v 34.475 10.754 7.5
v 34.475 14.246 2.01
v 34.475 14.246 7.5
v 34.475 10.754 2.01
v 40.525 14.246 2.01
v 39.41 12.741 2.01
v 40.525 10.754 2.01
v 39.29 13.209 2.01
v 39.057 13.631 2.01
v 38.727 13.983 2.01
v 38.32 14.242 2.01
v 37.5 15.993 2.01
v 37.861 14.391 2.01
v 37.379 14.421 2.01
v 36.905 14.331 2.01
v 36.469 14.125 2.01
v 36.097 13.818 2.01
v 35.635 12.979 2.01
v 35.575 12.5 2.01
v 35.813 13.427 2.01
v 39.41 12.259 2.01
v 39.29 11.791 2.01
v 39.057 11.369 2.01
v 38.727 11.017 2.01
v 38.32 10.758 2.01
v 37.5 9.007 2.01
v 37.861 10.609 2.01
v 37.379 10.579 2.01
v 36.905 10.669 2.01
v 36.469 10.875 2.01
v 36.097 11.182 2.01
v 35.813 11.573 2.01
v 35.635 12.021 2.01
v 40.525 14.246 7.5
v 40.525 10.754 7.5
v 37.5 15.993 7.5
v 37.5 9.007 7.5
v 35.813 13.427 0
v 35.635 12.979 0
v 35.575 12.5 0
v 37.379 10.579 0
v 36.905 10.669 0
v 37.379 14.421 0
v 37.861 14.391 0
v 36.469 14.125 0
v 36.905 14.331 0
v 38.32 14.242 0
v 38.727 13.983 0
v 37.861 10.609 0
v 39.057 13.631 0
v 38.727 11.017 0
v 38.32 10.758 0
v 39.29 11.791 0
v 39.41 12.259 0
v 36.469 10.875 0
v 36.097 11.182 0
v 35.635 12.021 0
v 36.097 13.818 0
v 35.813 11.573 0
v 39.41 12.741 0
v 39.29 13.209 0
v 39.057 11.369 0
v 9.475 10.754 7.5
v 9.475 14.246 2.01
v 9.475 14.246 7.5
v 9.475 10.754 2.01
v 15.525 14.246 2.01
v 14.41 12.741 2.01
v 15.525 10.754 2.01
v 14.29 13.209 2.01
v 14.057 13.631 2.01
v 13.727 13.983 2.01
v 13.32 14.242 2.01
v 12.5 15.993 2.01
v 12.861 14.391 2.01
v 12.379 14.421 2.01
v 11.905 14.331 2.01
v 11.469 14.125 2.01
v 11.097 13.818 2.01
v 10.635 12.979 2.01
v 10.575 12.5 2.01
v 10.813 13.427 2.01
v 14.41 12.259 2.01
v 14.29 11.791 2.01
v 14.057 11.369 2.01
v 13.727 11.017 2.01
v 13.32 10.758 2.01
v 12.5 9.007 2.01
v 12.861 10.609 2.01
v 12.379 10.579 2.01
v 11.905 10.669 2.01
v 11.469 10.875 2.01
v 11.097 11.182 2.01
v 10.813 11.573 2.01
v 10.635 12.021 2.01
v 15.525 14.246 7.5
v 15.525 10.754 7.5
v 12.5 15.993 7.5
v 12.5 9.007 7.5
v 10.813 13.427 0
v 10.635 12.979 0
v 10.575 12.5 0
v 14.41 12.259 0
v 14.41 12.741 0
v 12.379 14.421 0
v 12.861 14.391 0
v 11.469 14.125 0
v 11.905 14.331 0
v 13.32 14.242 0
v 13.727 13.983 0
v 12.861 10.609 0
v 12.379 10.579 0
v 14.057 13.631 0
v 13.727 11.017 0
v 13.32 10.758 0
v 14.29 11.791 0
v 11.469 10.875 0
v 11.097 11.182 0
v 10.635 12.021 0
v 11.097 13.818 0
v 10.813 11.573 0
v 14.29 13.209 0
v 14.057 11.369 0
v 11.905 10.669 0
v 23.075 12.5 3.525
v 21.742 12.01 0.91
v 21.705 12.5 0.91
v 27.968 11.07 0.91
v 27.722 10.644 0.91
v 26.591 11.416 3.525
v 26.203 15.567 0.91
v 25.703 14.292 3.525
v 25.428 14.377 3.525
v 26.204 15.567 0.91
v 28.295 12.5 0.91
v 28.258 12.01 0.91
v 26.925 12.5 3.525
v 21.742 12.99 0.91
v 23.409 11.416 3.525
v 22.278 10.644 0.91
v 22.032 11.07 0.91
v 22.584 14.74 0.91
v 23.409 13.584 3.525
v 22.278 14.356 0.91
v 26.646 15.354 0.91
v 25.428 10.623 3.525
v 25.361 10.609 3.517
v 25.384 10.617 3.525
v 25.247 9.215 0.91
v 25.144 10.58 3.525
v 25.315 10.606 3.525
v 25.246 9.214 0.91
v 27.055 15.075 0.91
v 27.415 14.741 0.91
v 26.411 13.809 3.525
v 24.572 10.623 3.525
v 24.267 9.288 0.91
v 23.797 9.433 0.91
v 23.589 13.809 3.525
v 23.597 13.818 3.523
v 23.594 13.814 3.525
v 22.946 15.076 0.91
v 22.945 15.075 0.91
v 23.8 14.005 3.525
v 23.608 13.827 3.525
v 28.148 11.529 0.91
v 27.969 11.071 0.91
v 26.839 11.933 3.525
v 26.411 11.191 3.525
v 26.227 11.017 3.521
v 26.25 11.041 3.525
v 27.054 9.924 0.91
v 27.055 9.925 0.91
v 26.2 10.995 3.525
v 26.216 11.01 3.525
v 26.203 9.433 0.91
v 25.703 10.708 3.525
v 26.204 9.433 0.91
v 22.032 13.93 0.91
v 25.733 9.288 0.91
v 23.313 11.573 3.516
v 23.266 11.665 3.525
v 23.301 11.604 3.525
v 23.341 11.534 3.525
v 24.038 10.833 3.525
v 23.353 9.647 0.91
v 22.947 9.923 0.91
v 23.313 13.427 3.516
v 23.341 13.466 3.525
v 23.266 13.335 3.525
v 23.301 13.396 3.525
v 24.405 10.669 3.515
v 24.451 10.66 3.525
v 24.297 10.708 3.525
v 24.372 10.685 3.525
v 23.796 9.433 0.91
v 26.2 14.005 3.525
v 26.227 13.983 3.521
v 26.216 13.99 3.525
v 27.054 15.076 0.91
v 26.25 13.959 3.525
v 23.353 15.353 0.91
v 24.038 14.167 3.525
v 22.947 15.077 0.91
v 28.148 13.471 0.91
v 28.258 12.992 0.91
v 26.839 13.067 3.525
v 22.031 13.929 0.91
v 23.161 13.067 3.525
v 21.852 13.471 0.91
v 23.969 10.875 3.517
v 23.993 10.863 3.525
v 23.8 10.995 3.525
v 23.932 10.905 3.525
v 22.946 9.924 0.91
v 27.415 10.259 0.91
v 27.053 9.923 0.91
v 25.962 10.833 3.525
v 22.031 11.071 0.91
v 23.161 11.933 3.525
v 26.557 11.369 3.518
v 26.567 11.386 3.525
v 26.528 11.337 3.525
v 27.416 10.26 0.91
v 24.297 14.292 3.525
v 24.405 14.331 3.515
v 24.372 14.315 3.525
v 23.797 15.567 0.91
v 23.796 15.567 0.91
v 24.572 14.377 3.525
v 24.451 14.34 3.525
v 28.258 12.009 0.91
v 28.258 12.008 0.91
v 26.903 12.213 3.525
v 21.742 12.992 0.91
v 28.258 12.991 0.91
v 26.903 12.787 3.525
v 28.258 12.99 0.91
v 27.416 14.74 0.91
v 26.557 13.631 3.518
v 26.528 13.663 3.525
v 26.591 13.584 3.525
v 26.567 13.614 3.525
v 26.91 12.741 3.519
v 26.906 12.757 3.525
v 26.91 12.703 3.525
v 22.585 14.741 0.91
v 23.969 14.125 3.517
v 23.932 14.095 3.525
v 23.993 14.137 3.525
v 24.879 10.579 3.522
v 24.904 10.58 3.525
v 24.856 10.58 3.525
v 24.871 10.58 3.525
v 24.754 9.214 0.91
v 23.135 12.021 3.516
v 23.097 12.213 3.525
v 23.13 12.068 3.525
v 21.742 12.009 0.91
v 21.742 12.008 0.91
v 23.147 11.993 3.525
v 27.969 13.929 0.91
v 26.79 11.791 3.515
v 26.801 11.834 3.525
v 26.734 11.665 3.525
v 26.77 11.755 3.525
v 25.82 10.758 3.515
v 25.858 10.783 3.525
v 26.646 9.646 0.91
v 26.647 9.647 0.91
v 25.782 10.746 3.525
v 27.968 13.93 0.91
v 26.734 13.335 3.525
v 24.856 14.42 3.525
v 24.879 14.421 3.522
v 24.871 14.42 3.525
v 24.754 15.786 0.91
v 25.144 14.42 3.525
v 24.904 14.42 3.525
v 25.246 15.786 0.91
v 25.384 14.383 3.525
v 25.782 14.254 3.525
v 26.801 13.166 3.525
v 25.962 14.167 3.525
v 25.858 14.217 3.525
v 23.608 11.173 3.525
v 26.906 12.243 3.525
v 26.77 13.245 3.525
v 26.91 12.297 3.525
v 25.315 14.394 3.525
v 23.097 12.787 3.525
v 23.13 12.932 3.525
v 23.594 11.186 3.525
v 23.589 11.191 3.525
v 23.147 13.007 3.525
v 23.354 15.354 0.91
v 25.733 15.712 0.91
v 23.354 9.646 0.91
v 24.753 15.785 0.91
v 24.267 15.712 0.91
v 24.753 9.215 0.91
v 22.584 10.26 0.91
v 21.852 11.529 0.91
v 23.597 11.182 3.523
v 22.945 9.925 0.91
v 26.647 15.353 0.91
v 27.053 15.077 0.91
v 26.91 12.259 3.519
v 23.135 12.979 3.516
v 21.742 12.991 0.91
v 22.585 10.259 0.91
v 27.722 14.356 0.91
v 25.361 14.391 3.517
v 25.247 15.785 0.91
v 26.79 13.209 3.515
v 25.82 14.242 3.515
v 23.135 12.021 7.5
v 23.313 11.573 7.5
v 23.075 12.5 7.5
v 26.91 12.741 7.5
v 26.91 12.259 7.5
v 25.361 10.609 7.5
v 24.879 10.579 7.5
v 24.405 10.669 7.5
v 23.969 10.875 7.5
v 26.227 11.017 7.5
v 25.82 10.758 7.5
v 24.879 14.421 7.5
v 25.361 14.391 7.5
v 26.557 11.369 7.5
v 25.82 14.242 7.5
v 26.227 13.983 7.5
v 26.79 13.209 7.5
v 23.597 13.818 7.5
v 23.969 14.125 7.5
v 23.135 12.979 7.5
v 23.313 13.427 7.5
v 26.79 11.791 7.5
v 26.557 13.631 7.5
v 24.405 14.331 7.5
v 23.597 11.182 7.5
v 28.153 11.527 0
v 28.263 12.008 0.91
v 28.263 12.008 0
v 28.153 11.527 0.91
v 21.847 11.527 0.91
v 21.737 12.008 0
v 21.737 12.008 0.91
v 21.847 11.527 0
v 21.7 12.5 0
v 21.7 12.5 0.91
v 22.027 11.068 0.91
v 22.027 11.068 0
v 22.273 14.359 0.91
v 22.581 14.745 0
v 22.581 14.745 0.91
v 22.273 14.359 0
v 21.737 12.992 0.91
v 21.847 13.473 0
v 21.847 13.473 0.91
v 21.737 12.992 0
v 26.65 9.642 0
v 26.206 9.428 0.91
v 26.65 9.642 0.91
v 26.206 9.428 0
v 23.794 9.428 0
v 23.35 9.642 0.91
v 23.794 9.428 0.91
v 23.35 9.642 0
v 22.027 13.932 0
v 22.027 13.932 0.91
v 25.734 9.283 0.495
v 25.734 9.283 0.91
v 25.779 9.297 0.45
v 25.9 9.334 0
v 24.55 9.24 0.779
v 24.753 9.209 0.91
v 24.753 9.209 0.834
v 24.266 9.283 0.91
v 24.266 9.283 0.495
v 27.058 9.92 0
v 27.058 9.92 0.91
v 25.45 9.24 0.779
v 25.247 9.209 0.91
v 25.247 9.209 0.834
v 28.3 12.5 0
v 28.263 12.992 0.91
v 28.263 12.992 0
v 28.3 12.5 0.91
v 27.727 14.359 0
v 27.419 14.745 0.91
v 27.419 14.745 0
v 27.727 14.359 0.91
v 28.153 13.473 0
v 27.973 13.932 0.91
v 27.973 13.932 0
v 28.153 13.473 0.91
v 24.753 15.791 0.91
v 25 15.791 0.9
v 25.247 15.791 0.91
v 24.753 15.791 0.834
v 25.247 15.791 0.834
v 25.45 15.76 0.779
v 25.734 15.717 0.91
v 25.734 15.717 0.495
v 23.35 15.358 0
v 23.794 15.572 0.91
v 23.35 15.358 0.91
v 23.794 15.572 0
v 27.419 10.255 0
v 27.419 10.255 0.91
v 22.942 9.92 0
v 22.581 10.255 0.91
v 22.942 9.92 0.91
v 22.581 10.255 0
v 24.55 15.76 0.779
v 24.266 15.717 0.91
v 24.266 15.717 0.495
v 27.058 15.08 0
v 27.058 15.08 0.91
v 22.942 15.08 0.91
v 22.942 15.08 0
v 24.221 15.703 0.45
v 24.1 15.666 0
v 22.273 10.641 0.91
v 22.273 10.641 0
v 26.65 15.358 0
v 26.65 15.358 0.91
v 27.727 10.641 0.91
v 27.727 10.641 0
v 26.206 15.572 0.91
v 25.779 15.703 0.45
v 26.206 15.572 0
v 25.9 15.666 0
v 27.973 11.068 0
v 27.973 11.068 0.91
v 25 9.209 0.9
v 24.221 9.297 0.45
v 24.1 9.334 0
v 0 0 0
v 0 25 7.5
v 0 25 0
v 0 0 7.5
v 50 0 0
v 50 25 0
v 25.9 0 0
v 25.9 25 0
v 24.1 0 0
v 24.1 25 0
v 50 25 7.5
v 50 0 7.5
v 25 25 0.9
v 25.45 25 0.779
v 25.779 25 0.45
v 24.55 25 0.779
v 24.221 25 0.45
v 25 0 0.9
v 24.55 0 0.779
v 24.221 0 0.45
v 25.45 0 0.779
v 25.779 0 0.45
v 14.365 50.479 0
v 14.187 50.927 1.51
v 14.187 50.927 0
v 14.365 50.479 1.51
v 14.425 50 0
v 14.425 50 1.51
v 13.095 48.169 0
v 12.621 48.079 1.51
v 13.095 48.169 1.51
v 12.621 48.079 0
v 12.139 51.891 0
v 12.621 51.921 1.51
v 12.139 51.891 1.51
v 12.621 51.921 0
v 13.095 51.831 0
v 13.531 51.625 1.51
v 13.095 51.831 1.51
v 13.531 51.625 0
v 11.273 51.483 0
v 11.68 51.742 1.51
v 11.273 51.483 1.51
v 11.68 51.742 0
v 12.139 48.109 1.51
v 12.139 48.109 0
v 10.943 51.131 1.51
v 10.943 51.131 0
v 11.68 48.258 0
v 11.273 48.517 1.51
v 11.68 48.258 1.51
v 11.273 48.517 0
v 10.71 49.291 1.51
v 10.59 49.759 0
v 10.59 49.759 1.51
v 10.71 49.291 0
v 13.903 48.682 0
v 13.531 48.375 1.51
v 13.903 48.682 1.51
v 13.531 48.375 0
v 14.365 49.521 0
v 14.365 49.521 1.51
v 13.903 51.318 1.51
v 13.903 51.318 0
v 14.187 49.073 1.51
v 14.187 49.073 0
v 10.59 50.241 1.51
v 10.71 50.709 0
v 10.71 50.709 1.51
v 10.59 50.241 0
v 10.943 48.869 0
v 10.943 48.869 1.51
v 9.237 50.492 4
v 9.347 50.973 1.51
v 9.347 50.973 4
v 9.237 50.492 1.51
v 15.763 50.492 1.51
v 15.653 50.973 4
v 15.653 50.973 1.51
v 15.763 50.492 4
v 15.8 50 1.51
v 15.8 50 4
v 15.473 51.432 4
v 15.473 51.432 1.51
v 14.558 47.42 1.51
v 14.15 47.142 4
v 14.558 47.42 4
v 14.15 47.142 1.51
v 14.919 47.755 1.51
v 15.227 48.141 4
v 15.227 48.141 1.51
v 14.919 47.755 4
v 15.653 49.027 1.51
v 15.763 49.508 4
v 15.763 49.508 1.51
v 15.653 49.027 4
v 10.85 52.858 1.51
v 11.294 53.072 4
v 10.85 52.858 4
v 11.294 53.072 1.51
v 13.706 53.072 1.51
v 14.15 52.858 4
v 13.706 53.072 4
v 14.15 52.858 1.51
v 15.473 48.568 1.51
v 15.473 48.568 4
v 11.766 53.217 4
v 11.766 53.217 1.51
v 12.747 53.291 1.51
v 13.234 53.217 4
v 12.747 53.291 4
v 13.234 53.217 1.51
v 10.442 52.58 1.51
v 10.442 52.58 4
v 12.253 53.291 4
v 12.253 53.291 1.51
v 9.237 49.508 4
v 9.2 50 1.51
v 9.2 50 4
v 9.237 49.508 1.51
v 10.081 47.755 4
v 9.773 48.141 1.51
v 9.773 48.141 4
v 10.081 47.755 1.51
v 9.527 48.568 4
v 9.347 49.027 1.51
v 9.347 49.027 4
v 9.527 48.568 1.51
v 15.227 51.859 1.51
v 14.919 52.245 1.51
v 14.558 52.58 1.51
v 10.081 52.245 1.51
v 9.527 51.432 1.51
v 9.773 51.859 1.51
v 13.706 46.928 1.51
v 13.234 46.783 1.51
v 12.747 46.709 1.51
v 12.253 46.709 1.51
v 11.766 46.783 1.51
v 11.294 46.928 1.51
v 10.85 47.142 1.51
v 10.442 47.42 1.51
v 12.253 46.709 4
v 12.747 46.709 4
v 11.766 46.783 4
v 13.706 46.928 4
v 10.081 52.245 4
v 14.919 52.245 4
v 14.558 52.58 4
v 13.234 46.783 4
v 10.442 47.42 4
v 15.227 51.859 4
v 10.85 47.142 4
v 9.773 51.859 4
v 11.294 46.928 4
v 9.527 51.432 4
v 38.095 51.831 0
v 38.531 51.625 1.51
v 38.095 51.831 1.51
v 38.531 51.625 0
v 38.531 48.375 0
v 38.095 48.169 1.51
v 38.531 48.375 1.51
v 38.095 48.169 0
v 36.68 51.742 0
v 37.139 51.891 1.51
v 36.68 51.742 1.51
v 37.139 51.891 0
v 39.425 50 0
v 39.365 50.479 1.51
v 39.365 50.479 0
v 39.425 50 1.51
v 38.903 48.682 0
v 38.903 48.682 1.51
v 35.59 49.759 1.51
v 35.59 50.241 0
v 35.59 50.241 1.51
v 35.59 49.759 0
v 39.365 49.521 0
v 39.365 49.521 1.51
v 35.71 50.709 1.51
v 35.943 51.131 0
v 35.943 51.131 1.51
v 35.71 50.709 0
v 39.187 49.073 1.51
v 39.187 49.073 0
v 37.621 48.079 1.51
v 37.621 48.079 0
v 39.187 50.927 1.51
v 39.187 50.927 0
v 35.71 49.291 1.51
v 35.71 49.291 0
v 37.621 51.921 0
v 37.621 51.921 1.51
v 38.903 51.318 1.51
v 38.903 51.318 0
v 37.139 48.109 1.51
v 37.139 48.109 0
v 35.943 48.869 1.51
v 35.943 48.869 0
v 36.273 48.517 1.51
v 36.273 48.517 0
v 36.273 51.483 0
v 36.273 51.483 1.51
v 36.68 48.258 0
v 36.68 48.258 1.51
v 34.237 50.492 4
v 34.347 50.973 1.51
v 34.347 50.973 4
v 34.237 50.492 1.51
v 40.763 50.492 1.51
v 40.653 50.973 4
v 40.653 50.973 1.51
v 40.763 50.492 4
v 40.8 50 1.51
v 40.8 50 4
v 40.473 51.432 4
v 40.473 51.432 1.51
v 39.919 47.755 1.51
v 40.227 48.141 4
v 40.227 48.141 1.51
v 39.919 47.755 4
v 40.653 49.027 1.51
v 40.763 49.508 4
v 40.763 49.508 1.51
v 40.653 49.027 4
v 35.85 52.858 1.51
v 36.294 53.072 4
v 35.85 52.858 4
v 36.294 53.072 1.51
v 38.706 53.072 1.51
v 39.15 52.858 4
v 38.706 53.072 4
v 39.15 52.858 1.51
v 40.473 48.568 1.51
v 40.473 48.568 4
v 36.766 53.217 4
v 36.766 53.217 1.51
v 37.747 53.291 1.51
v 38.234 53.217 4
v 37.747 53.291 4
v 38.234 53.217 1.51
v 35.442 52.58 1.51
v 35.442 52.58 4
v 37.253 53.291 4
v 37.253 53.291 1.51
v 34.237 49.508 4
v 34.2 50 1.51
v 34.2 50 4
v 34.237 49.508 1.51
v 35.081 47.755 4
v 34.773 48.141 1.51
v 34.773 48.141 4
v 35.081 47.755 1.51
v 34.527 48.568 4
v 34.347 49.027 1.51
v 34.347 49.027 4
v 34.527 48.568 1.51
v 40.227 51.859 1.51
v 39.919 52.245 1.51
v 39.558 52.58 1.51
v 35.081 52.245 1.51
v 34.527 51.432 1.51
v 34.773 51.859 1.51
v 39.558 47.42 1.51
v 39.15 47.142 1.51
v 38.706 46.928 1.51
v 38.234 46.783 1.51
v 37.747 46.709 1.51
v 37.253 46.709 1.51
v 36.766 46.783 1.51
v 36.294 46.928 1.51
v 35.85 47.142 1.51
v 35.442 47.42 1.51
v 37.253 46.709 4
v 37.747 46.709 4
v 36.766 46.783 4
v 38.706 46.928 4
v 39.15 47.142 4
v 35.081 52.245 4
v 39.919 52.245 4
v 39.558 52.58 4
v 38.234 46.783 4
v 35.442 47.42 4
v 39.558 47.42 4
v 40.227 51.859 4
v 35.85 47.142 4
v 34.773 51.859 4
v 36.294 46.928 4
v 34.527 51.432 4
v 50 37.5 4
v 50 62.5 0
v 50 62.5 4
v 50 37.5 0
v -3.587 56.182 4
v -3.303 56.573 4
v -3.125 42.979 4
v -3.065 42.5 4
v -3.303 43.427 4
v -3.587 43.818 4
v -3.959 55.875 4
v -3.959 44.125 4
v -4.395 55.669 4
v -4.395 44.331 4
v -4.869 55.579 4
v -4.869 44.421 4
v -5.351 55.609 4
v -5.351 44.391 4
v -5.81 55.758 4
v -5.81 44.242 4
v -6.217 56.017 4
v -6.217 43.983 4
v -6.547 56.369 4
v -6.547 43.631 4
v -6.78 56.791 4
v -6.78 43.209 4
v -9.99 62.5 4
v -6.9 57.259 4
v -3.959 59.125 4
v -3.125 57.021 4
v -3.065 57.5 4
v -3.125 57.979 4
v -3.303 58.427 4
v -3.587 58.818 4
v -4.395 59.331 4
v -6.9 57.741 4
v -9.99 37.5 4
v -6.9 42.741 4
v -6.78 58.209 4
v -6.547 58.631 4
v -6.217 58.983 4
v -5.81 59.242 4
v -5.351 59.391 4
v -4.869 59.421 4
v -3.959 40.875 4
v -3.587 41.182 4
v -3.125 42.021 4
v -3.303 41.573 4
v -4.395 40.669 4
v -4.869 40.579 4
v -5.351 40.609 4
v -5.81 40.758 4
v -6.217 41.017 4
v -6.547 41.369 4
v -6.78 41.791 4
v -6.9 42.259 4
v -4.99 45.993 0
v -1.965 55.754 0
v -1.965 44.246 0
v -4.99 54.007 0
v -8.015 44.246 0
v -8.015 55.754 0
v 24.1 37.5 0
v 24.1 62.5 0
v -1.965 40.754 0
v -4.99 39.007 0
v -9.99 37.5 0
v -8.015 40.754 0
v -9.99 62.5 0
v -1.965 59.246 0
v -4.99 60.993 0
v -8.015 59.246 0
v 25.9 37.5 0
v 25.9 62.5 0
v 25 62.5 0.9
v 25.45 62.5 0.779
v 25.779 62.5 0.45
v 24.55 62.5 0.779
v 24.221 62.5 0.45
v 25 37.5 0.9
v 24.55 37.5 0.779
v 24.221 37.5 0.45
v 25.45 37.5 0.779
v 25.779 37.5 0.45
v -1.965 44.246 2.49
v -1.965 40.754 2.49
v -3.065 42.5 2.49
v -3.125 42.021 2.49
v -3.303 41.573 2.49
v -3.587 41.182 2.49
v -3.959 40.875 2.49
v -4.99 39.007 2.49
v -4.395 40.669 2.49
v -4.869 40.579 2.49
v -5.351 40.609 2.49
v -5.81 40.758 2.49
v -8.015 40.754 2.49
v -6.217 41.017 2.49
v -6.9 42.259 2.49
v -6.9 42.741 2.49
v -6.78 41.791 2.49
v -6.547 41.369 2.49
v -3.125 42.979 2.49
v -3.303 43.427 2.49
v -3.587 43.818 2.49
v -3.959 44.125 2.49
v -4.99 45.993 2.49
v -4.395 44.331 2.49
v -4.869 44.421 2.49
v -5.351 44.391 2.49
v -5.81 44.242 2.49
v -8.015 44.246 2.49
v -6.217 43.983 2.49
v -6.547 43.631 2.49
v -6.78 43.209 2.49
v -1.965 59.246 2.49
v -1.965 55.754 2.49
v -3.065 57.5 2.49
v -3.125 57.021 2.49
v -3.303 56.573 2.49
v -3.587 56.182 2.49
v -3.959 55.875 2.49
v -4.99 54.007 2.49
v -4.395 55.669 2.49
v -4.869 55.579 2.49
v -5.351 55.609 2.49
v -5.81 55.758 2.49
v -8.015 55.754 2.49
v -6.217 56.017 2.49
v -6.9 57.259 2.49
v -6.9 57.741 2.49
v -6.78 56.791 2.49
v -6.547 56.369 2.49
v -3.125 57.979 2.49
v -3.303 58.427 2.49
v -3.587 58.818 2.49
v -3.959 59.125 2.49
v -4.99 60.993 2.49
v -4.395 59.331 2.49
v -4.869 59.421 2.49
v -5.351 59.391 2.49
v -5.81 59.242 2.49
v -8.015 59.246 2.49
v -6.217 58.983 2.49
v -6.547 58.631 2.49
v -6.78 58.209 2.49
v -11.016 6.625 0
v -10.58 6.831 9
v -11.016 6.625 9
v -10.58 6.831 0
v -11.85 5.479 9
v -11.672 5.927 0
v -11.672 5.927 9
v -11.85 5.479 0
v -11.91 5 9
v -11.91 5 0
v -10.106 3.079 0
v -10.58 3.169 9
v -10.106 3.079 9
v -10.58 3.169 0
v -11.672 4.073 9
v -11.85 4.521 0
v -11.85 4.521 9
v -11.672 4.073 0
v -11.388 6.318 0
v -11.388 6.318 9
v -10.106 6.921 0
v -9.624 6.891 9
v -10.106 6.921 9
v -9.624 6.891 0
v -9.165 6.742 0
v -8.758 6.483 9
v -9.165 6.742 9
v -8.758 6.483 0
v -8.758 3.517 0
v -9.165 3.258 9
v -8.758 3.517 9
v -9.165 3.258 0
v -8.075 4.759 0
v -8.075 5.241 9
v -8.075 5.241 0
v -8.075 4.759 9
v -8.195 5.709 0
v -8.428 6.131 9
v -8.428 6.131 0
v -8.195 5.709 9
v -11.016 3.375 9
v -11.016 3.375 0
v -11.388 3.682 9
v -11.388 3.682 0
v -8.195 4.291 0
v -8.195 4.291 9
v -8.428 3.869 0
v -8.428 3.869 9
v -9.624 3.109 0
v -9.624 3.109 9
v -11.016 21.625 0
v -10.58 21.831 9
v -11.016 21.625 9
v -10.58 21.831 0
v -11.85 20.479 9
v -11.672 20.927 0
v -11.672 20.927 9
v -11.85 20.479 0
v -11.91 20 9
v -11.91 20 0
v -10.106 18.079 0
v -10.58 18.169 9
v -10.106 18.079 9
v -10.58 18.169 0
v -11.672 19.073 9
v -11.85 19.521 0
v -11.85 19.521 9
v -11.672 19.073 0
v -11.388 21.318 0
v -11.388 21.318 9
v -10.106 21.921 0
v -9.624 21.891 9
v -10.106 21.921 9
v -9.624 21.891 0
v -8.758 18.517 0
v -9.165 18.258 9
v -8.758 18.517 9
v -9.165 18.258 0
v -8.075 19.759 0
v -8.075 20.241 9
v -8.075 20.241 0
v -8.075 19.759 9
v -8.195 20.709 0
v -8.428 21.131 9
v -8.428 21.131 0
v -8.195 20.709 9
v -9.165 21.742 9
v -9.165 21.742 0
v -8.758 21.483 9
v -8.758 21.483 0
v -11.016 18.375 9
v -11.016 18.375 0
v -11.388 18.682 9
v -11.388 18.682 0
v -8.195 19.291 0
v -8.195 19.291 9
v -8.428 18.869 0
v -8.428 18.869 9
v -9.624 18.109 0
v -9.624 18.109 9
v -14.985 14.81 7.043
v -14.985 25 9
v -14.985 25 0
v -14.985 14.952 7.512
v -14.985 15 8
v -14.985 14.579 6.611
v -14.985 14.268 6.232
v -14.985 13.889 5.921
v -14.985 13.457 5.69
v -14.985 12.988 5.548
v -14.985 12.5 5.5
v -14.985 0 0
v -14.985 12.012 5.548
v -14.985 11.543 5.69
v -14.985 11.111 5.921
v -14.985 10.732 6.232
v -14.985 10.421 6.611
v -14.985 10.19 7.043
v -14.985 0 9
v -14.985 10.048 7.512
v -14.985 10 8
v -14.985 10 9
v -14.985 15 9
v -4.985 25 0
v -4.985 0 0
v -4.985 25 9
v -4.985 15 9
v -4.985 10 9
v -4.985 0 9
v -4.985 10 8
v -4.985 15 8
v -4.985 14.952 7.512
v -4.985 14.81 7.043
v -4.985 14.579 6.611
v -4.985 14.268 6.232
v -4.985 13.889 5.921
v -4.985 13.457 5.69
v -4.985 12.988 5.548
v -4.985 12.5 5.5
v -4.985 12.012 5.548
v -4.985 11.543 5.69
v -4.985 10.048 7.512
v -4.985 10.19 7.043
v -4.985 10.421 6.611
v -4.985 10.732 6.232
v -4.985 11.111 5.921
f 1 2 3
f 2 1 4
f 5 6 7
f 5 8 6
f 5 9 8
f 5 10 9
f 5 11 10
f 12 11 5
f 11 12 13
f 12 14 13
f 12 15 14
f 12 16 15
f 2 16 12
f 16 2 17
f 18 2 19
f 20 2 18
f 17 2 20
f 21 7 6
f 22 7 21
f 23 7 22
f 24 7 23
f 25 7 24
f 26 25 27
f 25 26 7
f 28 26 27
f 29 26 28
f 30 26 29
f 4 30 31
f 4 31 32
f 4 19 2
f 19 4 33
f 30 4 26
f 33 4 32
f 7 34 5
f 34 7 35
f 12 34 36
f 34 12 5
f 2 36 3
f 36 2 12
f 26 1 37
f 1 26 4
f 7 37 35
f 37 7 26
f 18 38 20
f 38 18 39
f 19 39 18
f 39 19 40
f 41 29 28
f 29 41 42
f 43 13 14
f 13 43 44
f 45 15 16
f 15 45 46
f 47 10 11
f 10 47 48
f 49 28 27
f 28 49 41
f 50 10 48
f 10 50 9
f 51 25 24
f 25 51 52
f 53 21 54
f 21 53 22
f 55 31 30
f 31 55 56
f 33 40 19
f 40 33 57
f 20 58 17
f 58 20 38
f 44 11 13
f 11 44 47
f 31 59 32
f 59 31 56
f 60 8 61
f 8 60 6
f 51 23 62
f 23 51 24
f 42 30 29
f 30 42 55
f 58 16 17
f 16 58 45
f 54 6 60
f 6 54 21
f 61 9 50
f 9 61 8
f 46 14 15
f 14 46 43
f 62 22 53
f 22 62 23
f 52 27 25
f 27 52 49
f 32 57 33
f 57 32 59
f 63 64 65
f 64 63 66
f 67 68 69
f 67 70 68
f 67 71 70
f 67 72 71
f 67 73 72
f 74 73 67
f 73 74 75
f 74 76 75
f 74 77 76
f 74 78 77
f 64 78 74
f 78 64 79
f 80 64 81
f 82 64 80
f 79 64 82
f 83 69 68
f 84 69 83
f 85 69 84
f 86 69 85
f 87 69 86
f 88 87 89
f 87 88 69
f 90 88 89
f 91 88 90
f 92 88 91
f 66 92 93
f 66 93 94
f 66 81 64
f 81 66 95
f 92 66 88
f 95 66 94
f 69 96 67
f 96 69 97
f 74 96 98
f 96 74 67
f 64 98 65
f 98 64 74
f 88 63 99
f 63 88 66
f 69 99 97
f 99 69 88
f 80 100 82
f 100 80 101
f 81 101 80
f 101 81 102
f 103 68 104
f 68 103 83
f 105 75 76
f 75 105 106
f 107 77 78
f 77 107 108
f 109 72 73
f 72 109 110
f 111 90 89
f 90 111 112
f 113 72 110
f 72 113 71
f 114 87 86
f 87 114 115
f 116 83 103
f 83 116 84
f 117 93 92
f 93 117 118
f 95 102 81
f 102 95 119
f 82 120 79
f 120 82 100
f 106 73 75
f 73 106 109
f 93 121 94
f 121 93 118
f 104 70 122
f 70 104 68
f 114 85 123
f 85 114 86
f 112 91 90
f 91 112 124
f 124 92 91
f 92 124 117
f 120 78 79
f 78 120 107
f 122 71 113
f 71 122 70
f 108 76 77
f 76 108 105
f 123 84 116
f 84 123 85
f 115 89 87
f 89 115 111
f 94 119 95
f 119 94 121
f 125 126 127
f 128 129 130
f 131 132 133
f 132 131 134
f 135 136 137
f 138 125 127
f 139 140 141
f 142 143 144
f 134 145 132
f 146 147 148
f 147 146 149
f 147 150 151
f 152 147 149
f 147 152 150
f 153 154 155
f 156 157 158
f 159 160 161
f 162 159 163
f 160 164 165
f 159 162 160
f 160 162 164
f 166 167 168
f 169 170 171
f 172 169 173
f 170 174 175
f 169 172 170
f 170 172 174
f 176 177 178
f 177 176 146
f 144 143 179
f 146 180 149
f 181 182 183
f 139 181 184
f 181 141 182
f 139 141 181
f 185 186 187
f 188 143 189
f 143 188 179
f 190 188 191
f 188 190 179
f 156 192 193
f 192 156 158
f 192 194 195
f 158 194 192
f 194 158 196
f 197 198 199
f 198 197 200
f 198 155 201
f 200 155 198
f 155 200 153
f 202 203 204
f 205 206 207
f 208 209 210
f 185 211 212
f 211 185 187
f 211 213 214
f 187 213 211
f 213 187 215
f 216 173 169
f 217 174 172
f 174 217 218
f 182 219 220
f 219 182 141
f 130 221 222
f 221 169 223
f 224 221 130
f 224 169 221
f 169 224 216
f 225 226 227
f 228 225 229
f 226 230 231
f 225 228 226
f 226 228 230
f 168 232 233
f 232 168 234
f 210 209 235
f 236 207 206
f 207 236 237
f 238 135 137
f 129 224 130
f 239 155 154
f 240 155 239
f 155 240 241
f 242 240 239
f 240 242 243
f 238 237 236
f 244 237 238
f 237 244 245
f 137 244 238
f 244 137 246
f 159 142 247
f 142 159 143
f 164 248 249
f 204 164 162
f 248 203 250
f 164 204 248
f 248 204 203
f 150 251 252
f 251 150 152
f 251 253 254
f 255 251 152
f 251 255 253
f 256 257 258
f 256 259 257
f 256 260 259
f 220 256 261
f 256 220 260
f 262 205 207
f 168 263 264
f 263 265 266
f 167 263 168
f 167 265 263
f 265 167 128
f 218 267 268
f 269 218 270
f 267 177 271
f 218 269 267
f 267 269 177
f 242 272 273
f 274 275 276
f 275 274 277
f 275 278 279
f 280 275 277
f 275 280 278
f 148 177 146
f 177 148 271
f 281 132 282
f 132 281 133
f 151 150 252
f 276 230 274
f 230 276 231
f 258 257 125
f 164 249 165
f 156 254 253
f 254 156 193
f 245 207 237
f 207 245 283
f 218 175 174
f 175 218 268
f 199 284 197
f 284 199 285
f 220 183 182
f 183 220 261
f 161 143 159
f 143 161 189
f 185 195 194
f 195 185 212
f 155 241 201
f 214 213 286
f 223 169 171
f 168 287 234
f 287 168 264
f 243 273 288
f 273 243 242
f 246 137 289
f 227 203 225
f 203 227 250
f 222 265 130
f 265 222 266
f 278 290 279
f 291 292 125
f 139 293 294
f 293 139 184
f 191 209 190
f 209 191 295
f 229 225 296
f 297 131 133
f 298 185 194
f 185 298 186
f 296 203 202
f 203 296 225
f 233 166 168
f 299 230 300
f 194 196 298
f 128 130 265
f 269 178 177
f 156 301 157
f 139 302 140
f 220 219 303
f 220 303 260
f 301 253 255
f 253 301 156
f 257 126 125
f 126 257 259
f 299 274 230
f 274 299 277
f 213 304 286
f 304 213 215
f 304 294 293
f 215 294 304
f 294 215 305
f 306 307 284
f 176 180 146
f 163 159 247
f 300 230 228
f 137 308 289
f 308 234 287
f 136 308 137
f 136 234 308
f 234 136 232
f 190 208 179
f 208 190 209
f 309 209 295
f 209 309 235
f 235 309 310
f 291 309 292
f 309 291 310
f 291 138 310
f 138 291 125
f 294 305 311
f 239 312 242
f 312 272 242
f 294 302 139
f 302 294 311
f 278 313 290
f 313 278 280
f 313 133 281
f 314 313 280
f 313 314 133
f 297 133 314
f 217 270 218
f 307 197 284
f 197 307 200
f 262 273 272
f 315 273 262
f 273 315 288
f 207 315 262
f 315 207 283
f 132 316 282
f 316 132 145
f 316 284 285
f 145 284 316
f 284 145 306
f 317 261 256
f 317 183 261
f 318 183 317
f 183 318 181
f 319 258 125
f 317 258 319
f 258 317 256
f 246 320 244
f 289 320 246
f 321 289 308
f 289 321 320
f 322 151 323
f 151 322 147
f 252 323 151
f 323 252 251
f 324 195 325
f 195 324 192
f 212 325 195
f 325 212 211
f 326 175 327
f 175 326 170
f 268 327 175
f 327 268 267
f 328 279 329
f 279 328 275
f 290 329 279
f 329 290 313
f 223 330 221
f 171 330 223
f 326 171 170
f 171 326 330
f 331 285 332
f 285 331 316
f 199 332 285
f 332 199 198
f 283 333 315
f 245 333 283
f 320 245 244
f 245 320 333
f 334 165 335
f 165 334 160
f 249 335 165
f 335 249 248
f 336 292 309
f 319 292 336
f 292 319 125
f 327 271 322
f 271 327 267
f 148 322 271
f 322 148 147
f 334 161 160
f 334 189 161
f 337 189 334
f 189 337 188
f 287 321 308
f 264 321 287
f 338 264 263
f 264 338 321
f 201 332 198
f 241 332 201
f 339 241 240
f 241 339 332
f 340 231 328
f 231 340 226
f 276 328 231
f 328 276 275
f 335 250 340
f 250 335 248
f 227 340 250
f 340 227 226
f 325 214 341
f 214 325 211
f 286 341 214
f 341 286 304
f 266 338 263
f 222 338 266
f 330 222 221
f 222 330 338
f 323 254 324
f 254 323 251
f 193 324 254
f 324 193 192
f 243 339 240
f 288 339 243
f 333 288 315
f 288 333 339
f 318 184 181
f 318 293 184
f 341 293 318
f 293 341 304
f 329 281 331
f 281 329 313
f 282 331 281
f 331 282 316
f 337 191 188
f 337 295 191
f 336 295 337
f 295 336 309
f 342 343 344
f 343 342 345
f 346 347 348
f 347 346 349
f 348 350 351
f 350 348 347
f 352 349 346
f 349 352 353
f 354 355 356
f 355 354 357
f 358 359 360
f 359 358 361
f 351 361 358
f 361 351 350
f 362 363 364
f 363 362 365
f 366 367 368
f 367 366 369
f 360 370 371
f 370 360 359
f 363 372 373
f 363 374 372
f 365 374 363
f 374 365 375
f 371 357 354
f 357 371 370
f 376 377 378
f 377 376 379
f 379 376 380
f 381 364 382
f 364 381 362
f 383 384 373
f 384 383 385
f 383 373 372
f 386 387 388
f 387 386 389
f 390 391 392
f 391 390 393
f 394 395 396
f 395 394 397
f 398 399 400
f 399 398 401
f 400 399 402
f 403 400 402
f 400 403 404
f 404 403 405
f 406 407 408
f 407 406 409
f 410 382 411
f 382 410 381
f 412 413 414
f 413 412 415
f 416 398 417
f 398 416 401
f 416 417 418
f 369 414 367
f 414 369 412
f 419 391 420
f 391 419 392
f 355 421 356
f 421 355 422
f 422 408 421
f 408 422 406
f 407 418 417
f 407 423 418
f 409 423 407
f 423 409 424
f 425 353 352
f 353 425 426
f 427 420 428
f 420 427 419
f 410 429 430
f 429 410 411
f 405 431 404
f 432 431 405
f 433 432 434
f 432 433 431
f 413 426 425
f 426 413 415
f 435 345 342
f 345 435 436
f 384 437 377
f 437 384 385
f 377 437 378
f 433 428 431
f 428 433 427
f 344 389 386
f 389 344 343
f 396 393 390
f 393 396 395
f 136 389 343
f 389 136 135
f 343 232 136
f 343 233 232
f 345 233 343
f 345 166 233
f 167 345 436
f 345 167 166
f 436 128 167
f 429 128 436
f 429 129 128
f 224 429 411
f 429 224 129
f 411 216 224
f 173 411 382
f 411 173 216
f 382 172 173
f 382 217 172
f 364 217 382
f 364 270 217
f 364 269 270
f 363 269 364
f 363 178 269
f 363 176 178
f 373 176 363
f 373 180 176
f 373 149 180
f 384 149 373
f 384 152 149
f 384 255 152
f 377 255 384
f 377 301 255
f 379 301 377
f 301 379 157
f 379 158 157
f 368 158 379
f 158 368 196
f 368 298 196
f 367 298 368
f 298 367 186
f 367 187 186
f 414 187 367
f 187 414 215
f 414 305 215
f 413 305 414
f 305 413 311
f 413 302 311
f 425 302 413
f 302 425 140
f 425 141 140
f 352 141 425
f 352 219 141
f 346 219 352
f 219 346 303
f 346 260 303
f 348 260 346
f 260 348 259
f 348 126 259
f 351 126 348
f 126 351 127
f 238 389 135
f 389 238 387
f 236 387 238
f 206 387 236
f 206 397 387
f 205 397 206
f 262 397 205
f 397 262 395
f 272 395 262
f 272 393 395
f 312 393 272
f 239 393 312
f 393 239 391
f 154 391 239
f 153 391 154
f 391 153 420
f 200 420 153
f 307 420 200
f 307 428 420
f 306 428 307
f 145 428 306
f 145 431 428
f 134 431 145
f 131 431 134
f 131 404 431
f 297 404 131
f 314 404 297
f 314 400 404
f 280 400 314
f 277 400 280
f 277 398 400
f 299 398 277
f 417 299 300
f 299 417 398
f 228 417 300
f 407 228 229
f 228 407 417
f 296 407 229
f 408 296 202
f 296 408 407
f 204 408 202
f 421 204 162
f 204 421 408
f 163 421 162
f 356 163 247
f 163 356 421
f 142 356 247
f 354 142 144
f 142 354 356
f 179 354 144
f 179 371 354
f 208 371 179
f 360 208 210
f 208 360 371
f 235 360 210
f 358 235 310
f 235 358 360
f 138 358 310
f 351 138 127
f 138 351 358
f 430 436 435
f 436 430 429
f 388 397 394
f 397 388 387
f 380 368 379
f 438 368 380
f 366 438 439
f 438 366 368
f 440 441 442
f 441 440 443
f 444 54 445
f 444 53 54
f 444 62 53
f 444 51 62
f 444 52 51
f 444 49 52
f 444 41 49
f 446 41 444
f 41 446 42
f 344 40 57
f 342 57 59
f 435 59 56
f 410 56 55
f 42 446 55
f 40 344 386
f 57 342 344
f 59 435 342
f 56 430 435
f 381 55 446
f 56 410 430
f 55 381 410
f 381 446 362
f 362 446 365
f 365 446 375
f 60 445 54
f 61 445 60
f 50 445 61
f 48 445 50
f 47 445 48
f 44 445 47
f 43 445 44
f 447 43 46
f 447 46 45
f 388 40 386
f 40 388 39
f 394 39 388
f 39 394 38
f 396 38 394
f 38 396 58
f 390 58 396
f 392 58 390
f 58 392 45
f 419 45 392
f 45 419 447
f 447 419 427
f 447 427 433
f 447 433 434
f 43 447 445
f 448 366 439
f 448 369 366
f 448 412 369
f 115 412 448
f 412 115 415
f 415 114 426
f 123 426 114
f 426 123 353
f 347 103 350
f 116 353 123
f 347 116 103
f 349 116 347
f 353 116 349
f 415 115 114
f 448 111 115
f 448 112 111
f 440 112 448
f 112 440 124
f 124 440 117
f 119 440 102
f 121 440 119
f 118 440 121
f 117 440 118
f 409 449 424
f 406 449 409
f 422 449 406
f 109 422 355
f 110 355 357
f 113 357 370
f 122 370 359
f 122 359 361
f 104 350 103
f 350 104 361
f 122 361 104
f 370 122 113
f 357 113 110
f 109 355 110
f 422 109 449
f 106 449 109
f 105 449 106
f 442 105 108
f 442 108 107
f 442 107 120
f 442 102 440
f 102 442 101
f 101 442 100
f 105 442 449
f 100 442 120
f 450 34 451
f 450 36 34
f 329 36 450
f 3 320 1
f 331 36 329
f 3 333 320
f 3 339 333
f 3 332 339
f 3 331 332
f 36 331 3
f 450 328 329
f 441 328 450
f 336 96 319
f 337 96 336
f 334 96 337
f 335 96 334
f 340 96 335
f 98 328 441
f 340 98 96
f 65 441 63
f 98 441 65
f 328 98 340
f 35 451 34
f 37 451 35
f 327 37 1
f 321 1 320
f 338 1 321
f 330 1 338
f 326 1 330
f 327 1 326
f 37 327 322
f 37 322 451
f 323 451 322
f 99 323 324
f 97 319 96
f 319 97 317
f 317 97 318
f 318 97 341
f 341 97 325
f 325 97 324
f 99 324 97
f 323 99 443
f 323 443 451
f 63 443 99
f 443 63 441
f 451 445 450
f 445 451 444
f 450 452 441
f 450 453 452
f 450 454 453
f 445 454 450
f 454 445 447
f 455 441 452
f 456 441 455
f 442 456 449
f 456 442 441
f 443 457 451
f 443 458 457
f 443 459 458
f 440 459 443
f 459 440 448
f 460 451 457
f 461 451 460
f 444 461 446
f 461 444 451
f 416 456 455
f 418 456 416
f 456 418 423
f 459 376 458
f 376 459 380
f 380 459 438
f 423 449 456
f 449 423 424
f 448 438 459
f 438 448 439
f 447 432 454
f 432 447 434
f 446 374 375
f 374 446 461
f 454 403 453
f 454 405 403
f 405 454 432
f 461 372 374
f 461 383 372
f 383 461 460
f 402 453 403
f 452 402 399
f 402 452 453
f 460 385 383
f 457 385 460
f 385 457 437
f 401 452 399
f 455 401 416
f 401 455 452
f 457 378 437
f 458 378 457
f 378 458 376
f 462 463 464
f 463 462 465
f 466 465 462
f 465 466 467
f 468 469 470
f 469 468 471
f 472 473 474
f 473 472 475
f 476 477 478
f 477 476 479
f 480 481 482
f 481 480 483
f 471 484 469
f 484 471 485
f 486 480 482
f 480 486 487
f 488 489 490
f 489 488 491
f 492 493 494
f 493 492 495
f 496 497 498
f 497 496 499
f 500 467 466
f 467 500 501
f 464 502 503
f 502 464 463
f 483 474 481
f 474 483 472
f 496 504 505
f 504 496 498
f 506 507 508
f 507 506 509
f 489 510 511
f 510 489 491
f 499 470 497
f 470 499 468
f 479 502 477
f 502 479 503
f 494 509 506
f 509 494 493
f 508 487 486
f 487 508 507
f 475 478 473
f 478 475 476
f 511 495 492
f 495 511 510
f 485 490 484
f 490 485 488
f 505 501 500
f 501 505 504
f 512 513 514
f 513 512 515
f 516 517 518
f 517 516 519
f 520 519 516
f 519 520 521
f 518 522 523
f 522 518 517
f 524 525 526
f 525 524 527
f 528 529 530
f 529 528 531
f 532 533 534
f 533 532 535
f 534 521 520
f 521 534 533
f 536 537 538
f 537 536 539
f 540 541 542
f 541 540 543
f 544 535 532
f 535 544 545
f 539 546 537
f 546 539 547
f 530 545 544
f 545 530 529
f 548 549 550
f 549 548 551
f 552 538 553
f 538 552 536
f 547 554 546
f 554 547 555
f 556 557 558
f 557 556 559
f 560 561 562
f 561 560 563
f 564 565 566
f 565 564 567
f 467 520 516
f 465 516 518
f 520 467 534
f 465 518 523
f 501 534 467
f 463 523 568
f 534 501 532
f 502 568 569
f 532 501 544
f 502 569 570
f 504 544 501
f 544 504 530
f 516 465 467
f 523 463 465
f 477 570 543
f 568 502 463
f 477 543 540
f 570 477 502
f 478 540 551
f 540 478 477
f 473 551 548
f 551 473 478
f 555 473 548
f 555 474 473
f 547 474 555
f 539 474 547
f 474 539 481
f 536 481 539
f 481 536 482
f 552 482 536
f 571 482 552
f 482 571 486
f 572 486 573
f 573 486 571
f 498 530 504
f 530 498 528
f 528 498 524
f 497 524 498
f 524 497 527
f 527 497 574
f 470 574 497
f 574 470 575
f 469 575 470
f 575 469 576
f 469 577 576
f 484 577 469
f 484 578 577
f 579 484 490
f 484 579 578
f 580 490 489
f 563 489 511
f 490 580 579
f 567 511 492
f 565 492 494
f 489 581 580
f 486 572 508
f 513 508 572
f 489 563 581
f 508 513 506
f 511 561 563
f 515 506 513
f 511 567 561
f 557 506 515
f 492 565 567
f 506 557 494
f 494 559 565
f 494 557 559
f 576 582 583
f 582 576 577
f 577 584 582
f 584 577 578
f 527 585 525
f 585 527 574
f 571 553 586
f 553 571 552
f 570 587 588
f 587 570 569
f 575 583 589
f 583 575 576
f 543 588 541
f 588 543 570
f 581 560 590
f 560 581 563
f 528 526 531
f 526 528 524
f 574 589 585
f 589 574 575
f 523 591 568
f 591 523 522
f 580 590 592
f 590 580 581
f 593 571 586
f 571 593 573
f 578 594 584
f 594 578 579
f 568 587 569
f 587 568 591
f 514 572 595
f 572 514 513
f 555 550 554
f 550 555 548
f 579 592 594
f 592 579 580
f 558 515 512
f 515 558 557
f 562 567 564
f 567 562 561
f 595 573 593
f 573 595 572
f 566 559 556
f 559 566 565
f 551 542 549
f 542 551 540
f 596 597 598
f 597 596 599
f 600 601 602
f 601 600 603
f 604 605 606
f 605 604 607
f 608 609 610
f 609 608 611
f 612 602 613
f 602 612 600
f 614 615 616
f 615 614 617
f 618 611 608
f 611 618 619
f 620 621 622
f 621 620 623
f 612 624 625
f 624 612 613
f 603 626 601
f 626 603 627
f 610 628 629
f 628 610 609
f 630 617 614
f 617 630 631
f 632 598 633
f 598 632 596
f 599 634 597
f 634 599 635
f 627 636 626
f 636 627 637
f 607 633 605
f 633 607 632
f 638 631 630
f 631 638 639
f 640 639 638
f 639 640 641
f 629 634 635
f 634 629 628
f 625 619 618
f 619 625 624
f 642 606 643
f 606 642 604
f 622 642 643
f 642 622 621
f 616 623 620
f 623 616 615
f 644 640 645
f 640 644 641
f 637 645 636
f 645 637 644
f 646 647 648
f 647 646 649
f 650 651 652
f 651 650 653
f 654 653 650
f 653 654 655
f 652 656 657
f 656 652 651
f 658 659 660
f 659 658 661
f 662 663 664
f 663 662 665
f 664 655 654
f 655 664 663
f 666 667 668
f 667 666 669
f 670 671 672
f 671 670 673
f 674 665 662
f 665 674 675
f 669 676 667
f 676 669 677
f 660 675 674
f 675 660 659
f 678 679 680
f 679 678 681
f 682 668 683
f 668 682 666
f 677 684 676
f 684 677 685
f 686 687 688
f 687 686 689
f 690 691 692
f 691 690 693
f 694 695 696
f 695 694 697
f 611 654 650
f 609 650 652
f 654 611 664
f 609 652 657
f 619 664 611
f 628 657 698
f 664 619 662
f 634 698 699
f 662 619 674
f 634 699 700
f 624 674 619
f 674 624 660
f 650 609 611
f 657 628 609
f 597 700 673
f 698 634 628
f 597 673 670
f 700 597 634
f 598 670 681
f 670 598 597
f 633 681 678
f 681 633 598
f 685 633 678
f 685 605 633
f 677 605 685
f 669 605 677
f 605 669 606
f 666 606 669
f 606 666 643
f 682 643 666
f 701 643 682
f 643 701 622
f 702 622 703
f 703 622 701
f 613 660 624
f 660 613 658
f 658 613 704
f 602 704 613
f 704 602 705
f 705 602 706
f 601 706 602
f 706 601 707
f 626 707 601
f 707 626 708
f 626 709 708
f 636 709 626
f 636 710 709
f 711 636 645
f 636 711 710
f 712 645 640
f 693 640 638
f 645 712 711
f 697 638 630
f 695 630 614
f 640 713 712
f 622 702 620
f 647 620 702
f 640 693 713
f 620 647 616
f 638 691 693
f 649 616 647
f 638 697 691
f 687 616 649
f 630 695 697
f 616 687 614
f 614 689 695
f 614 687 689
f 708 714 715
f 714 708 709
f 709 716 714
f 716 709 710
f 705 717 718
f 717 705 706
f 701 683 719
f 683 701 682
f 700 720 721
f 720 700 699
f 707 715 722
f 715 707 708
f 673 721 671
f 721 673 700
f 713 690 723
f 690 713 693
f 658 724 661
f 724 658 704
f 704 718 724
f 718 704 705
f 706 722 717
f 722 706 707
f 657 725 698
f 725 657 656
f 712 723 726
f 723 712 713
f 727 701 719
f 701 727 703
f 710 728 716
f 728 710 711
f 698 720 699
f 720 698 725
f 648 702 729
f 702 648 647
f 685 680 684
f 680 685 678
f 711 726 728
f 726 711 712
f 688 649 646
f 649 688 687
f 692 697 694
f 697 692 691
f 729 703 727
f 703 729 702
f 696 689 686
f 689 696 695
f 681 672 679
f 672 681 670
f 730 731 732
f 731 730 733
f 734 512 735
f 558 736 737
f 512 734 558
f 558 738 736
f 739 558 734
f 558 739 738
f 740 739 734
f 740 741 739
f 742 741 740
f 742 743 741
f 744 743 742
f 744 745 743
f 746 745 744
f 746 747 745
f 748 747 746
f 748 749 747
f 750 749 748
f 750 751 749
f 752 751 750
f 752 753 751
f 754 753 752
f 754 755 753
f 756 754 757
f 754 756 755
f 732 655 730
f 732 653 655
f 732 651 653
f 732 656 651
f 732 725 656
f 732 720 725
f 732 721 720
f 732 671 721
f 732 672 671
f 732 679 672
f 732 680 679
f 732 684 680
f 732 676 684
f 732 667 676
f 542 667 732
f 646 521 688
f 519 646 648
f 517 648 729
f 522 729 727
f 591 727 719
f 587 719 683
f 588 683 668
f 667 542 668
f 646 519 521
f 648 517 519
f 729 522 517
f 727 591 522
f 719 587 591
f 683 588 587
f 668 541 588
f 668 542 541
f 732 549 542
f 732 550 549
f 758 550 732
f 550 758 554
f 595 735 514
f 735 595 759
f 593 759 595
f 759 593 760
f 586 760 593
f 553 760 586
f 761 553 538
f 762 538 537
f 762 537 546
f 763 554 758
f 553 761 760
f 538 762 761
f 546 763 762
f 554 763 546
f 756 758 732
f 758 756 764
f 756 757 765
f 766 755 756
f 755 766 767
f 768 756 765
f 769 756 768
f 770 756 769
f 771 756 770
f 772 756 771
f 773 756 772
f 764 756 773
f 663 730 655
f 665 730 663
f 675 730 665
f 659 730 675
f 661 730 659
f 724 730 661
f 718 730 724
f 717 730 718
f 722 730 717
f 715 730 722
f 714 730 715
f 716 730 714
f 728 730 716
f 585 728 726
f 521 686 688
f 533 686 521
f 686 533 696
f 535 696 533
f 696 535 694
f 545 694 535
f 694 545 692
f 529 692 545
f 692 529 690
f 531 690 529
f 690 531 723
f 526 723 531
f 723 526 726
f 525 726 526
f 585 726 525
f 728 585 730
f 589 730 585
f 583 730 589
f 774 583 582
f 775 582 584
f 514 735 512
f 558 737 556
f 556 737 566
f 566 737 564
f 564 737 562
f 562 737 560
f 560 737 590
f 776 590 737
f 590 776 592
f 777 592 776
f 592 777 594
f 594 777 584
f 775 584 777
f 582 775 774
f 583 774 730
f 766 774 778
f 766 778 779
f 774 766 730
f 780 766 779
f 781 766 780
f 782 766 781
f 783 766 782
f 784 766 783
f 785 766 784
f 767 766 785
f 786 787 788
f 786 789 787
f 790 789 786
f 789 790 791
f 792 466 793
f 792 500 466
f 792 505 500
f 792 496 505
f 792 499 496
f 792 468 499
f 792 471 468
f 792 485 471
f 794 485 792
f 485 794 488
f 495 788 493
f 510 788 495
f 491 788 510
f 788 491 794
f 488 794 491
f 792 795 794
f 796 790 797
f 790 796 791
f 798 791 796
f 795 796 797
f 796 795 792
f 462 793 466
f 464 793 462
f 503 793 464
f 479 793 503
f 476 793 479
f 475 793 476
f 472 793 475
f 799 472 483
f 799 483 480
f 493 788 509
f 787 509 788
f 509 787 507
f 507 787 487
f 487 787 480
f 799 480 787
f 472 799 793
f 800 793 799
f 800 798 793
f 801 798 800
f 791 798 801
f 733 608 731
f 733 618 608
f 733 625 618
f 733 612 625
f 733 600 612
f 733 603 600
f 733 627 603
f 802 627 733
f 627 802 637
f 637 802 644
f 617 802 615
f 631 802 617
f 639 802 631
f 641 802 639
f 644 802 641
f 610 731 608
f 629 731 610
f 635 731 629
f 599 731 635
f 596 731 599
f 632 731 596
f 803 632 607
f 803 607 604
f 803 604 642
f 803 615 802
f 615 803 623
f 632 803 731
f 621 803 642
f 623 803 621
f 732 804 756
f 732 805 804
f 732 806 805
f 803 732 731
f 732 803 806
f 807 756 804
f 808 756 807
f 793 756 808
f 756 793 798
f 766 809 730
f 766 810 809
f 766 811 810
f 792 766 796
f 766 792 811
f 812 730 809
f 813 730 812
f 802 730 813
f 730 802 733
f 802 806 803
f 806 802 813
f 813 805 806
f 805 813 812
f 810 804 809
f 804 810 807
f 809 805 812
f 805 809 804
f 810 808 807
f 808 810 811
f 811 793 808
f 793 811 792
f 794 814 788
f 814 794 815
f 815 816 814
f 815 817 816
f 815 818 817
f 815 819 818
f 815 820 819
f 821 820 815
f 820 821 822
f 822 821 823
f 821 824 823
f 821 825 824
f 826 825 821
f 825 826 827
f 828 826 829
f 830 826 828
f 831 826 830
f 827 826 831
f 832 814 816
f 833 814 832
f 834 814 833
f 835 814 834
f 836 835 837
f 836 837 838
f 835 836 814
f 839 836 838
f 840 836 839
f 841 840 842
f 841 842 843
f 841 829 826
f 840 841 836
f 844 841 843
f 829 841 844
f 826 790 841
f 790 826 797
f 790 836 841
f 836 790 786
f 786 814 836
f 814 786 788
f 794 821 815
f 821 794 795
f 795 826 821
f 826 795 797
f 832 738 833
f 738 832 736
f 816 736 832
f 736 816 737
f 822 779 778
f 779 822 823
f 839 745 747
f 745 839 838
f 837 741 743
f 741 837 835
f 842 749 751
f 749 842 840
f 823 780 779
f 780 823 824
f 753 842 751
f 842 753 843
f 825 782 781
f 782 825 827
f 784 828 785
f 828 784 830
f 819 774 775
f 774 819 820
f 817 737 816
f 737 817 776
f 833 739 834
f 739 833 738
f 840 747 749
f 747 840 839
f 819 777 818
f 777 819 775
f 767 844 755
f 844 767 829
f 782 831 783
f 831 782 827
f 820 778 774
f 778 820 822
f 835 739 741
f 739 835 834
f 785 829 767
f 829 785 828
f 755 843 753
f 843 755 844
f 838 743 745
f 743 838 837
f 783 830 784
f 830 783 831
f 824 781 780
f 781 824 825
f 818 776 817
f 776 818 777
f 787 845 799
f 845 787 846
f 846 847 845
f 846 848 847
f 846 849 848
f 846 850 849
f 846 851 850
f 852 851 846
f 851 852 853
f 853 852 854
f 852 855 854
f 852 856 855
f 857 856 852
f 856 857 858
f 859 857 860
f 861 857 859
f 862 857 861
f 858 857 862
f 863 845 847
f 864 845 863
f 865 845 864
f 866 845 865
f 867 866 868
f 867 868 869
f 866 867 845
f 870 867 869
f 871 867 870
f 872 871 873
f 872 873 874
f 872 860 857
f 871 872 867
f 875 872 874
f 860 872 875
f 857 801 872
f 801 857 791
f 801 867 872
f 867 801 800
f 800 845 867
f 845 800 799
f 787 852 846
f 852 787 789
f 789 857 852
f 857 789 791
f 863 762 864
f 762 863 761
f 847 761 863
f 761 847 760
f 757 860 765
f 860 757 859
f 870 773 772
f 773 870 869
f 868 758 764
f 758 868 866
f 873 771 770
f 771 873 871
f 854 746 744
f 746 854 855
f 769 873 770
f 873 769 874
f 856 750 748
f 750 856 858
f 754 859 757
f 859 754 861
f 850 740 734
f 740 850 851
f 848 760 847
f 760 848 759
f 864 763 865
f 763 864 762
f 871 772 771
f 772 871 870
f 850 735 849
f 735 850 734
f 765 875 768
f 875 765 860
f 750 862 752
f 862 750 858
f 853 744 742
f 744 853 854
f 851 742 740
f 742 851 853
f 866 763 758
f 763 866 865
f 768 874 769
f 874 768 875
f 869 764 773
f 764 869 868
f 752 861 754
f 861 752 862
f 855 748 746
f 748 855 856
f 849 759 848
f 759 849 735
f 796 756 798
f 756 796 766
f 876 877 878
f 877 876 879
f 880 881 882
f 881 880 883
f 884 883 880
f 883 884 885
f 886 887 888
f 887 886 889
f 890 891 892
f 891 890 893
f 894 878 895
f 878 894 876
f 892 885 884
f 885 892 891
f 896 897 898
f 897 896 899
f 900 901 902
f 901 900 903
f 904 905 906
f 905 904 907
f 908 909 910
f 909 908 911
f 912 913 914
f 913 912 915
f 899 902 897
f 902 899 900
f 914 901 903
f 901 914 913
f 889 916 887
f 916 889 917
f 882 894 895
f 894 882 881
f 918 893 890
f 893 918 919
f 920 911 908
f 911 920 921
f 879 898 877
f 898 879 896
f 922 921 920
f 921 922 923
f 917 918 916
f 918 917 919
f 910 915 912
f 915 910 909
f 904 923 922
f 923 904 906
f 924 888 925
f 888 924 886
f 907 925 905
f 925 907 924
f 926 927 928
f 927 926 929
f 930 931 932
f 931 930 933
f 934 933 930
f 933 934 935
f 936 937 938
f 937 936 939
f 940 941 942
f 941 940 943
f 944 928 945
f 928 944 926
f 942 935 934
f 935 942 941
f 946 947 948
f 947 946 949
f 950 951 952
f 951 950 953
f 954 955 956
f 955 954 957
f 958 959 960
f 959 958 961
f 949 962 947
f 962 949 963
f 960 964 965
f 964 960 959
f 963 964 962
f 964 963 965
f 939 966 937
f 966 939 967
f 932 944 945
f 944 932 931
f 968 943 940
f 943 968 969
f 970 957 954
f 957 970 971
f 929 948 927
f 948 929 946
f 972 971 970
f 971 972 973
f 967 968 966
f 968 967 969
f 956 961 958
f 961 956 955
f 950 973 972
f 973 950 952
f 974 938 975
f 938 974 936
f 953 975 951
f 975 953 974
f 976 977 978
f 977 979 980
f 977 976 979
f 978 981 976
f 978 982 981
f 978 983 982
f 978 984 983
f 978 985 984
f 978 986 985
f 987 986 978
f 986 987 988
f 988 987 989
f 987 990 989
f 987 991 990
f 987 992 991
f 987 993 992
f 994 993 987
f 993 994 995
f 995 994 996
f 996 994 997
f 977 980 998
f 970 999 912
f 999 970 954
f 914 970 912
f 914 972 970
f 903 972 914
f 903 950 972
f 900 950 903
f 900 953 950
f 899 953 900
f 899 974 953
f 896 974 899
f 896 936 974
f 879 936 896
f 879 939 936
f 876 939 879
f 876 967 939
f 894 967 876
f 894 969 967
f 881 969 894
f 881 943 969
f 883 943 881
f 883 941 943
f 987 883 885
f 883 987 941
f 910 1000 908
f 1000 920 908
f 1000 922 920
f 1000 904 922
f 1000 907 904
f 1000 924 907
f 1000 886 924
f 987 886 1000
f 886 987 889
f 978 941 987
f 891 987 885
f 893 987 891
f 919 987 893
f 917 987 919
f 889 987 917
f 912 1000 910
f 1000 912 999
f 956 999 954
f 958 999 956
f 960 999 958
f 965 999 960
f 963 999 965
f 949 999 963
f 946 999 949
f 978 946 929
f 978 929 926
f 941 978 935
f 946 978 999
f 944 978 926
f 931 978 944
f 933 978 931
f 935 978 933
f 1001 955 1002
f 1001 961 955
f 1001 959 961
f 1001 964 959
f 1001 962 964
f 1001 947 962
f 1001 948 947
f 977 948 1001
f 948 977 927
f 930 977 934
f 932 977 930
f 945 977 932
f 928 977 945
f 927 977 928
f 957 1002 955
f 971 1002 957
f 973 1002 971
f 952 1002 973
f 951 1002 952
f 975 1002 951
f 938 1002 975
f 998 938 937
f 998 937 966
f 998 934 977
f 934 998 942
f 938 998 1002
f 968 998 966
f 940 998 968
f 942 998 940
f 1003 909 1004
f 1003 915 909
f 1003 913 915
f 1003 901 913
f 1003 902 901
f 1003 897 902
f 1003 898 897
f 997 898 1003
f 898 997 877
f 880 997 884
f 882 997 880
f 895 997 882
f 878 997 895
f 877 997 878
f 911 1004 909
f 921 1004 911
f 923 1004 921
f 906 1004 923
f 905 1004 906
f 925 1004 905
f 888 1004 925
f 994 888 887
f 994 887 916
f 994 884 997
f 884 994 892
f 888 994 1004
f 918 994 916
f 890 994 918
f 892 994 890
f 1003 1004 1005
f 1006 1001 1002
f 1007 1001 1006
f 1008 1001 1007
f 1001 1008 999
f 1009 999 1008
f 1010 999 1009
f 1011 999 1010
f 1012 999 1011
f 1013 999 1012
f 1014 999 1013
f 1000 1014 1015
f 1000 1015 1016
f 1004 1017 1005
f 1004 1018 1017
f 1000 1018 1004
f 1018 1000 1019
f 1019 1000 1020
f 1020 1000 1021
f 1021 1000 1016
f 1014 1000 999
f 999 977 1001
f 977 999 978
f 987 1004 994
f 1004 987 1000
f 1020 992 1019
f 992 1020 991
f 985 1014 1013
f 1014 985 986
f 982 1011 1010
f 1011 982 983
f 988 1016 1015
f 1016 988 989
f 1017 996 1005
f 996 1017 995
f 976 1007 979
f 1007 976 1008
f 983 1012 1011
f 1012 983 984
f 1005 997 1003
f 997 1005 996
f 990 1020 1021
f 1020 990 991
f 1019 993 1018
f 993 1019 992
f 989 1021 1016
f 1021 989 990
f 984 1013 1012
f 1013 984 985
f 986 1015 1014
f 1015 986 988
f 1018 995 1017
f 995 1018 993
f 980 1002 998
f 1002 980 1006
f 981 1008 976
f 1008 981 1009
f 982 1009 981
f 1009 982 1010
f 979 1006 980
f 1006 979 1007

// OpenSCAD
// file: nuts.scad
e = 0.1; // epsilon

// Screws / Nuts
// described by a K-Element vector, offsets defined as follows
nut_diameter_low   = 0;
nut_diameter_high  = 1;
nut_height         = 2;
screw_channel      = 3;
screw_head_channel = 4;
screw_head_height  = 5;
m3 = [ 5.6,  6.5, 2.5, 3.5,  6.0, 2.5];
m4 = [ 7.0,  8.0, 3.5, 4.5,  7.5, 3.0];
m5 = [ 8.0,  9.2, 3.7, 5.0,  9.2, 3.5];
m6 = [10.0, 11.2, 5.0, 6.0, 10.1, 4.0];

module nut_hole (nut, h)
{
    w = (nut [nut_diameter_low] + nut [nut_diameter_high]) / 2;
    translate ([0, 0, h / 2]) difference () {
        cube ([w, 2*w, h], center = true);
        rotate ([0, 0, 30])
            translate ([0, 1.5 * w, 0])
                cube ([2*w, 2*w, h+e], center = true);
        rotate ([0, 0, -30])
            translate ([0, 1.5 * w, 0])
                cube ([2*w, 2*w, h+e], center = true);
        rotate ([0, 0, 30])
            translate ([0, -1.5 * w, 0])
                cube ([2*w, 2*w, h+e], center = true);
        rotate ([0, 0, -30])
            translate ([0, -1.5 * w, 0])
                cube ([2*w, 2*w, h+e], center = true);
    }
}

// A screw channel + cone for a sunk screw, with h2 it can be deeper
// h is the length of the screw, h2 is how far it is sunk in the cone
// height/width only depends on the given nut.
module countersunk_screw_hole (nut, h, h2 = 0)
{
    r2 = (nut [screw_channel] * 1.1) / 2;
    cylinder
        ( r1 = (nut [screw_head_channel] * 1.1) / 2
        , r2 = r2
        , h  = nut [screw_head_height]  * 1.05
        );
    cylinder (r = r2, h = h + nut [screw_head_height]);
    translate ([0, 0, -h2+e])
        cylinder (r = nut [screw_head_channel] * 1.1 / 2, h = h2);
}
//translate ([5, 0, 0])
//    countersunk_screw_hole (m5, 10, 10, $fa = 6, $fs = .5);

// A channel for a sideways embedded nut
// ehf is the factor for the embedded height for the hole of the nut, we
// make it a little wider than nut-height by default, but it can be
// overridden.
// ewf is the factor for the width of the hole (nut diameter * ewf)
module embedded_nut (nut, h, ehf=1.3, ewf=1)
{
    w = (nut [nut_diameter_low] + nut [nut_diameter_high]) / 2;
    union () {
        translate ([0, -w * ewf * 0.5, 0])
            cube ([nut [nut_height] * ehf, w * ewf, h]);
        rotate ([0, 90, 0]) rotate ([0, 0, 30])
            nut_hole (nut, nut [nut_height] * ehf);
    }
}
//embedded_nut (m3, 20);
// main file
include <nuts.scad>

e = 0.01;

h  =  7.5;
h2 =  4;
w  = 25;
l  = 50;
lz = 10;
wd =  1.8;
dc =  5;

module antenna_fastener_l (h=h, w=w, l=l, wd=wd, nut=m3)
{
    ss = nut [screw_channel]/2 * 1.1;
    translate ([l, 0, h]) {
        rotate ([0, 180, 0]) {
            difference () {
                cube ([l, w, h]);
                translate ([l/2, -w, h])
                    rotate ([-90, 0, 0])
                        cylinder (r=wd/2, h=3*w);
                for (x= [l/4, 3*l/4]) {
                    translate ([x, w/2, -e]) {
                        nut_hole (nut, h=h-2);
                        translate ([0, 0, -h])
                            cylinder (r = ss, h=3*h);
                    }
                }
                translate ([l/2, w/2, h-wd/2])
                    rotate ([180, 0, 0])
                        countersunk_screw_hole (nut, h=3*h, h2=h);
            }
        }
    }
}

module antenna_fastener_u (h2=h2, w=w, l=l, lz=lz, wd=wd, nut=m3)
{
    hc = nut [screw_head_channel]/2 * 1.1;
    hh = nut [nut_height];
    ss = nut [screw_channel]/2 * 1.1;
    difference () {
        cube ([l, w, h2]);
        translate ([l/2, -w, 0])
            rotate ([-90, 0, 0])
                cylinder (r=wd/2, h=3*w);
        for (x= [l/4, 3*l/4]) {
            translate ([x, w/2, 0]) {
                //countersunk_screw_hole (nut, h=3*h2);
                translate ([0, 0, -h2])
                    cylinder (r = nut [screw_channel]/2 * 1.1, h=3*h2);
                translate ([0, 0, h2 - hh + e])
                    cylinder (r = hc, h = hh);
            }
        }
    }
    translate ([-lz+e, 0, 0]) {
        difference () {
            cube ([lz, w, h2]);
            for (x= [lz/2, w - lz/2]) {
                translate ([lz/2, x, -e]) {
                    translate ([0, 0, -h2])
                        cylinder (r = ss, h = 3 * h2);
                    nut_hole (nut, h=nut [nut_height]);
                }
            }
        }
    }
}

module relief (h2=h2, w=w, lz=lz, dc=dc, yh=1.5, nut=m3)
{
    hd = h2 + dc;
    ss = nut [screw_channel]/2 * 1.1;
    translate ([lz, 0, hd]) {
        rotate ([0, 180, 0]) {
            difference () {
                cube ([lz, w, hd]);
                for (x= [lz/2, w - lz/2]) {
                    translate ([lz/2, x, -(hd)]) {
                        cylinder (r = ss, h = 3 * (hd));
                    }
                }
                hull () {
                    for (x= [0, dc+h2]) {
                        translate ([-lz, w/2, dc/2 - yh - x])
                            rotate ([0, 90, 0])
                                cylinder (r = dc/2, h=3*lz);
                    }
                }
            }
        }
    }
}

antenna_fastener_l ($fa=3, $fs=0.5);
translate ([0, 1.5*w, 0])
    antenna_fastener_u ($fa=3, $fs=0.5);
translate ([1.5 * (-lz+e), 0, 0])
    relief ($fa=3, $fs=0.5);
